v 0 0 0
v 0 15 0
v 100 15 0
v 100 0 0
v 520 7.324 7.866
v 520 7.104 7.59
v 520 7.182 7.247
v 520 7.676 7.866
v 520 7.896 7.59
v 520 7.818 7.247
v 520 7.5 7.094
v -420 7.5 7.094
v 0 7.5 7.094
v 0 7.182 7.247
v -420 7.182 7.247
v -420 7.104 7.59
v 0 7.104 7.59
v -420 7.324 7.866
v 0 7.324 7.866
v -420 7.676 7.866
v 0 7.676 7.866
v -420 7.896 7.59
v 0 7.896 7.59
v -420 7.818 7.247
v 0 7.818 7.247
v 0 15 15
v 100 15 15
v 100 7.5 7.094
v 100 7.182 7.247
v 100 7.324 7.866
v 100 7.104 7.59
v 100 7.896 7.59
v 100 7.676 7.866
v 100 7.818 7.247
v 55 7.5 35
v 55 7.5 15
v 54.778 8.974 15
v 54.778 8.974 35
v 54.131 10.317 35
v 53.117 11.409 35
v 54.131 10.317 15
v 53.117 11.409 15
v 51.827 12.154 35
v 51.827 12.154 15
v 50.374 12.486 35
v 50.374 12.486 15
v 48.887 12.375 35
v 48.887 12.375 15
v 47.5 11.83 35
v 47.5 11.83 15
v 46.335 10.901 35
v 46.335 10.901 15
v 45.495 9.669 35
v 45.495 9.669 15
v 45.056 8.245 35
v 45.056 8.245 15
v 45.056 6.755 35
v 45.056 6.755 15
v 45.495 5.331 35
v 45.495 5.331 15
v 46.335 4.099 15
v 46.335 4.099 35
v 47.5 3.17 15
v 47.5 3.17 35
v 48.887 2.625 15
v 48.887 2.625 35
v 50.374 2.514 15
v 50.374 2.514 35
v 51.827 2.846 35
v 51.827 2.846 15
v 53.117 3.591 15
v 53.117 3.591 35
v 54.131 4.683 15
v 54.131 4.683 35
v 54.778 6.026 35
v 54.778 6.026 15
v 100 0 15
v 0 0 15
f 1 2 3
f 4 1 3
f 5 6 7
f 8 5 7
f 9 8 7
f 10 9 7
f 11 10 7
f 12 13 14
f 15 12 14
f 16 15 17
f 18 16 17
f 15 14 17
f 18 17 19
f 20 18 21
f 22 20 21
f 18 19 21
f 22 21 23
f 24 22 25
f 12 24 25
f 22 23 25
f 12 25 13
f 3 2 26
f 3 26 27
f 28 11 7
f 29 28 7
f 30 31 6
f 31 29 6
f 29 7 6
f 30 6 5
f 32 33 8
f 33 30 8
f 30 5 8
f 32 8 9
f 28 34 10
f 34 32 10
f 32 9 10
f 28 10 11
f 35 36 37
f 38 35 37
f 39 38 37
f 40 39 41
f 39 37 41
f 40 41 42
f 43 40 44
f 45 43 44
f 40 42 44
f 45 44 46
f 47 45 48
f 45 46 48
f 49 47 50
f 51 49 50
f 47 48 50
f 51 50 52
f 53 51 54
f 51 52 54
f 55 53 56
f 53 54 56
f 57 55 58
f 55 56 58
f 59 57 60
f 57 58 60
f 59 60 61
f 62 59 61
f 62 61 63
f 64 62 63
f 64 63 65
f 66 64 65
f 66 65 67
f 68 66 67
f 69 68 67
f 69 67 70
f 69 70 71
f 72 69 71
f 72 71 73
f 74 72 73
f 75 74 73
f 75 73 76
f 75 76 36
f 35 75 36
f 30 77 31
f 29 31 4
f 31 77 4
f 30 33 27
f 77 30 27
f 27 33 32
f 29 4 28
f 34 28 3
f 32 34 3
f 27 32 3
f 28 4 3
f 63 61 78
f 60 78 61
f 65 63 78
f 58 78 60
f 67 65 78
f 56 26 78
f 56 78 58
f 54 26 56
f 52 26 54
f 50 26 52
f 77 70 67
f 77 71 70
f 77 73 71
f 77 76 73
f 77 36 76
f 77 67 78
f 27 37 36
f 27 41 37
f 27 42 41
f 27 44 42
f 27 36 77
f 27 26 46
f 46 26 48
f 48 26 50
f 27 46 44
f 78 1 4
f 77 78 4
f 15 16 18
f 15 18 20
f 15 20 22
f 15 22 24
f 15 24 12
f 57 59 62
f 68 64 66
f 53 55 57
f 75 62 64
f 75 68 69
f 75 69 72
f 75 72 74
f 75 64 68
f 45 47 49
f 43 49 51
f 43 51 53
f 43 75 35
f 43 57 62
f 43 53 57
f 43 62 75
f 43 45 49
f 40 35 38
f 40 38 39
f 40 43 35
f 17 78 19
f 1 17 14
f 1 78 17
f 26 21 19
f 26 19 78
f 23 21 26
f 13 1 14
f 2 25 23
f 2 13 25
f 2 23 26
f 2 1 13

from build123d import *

# Parameters (mm, degrees)
SKETCH1_W           = 100
SKETCH1_H           = 15
SKETCH1_R           = 5
BOSS_EXTRUDE1_DEPTH = 15
SKETCH1_2_R         = 5
BOSS_EXTRUDE2_DEPTH = 35
SKETCH2_R           = 0.4064
BOSS_EXTRUDE3_DEPTH = 420
BOSS_EXTRUDE4_START = -520
SKETCH2_2_R         = 0.4064
BOSS_EXTRUDE4_DEPTH = 520


with BuildPart() as part:
    # Sketch1 → Boss-Extrude1 (new body)
    with BuildSketch(Plane.XY):
        with Locations((50, 7.5)):
            Rectangle(SKETCH1_W, SKETCH1_H)
        with Locations((50, 7.5)):
            Circle(SKETCH1_R, mode=Mode.SUBTRACT)
    extrude(amount=BOSS_EXTRUDE1_DEPTH)

    # Sketch1<2> → Boss-Extrude2 (add)
    with BuildSketch(Plane.XY):
        with Locations((50, 7.5)):
            Circle(SKETCH1_2_R)
    extrude(amount=BOSS_EXTRUDE2_DEPTH)

    # Sketch2 → Boss-Extrude3 (add)
    with BuildSketch(Plane.ZY):
        with Locations((7.5, 7.5)):
            Circle(SKETCH2_R)
    extrude(amount=BOSS_EXTRUDE3_DEPTH)

    # Sketch2<2> → Boss-Extrude4 (add)
    with BuildSketch(Plane.ZY.offset(BOSS_EXTRUDE4_START)):
        with Locations((7.5, 7.5)):
            Circle(SKETCH2_2_R)
    extrude(amount=BOSS_EXTRUDE4_DEPTH)


solid = part.part
